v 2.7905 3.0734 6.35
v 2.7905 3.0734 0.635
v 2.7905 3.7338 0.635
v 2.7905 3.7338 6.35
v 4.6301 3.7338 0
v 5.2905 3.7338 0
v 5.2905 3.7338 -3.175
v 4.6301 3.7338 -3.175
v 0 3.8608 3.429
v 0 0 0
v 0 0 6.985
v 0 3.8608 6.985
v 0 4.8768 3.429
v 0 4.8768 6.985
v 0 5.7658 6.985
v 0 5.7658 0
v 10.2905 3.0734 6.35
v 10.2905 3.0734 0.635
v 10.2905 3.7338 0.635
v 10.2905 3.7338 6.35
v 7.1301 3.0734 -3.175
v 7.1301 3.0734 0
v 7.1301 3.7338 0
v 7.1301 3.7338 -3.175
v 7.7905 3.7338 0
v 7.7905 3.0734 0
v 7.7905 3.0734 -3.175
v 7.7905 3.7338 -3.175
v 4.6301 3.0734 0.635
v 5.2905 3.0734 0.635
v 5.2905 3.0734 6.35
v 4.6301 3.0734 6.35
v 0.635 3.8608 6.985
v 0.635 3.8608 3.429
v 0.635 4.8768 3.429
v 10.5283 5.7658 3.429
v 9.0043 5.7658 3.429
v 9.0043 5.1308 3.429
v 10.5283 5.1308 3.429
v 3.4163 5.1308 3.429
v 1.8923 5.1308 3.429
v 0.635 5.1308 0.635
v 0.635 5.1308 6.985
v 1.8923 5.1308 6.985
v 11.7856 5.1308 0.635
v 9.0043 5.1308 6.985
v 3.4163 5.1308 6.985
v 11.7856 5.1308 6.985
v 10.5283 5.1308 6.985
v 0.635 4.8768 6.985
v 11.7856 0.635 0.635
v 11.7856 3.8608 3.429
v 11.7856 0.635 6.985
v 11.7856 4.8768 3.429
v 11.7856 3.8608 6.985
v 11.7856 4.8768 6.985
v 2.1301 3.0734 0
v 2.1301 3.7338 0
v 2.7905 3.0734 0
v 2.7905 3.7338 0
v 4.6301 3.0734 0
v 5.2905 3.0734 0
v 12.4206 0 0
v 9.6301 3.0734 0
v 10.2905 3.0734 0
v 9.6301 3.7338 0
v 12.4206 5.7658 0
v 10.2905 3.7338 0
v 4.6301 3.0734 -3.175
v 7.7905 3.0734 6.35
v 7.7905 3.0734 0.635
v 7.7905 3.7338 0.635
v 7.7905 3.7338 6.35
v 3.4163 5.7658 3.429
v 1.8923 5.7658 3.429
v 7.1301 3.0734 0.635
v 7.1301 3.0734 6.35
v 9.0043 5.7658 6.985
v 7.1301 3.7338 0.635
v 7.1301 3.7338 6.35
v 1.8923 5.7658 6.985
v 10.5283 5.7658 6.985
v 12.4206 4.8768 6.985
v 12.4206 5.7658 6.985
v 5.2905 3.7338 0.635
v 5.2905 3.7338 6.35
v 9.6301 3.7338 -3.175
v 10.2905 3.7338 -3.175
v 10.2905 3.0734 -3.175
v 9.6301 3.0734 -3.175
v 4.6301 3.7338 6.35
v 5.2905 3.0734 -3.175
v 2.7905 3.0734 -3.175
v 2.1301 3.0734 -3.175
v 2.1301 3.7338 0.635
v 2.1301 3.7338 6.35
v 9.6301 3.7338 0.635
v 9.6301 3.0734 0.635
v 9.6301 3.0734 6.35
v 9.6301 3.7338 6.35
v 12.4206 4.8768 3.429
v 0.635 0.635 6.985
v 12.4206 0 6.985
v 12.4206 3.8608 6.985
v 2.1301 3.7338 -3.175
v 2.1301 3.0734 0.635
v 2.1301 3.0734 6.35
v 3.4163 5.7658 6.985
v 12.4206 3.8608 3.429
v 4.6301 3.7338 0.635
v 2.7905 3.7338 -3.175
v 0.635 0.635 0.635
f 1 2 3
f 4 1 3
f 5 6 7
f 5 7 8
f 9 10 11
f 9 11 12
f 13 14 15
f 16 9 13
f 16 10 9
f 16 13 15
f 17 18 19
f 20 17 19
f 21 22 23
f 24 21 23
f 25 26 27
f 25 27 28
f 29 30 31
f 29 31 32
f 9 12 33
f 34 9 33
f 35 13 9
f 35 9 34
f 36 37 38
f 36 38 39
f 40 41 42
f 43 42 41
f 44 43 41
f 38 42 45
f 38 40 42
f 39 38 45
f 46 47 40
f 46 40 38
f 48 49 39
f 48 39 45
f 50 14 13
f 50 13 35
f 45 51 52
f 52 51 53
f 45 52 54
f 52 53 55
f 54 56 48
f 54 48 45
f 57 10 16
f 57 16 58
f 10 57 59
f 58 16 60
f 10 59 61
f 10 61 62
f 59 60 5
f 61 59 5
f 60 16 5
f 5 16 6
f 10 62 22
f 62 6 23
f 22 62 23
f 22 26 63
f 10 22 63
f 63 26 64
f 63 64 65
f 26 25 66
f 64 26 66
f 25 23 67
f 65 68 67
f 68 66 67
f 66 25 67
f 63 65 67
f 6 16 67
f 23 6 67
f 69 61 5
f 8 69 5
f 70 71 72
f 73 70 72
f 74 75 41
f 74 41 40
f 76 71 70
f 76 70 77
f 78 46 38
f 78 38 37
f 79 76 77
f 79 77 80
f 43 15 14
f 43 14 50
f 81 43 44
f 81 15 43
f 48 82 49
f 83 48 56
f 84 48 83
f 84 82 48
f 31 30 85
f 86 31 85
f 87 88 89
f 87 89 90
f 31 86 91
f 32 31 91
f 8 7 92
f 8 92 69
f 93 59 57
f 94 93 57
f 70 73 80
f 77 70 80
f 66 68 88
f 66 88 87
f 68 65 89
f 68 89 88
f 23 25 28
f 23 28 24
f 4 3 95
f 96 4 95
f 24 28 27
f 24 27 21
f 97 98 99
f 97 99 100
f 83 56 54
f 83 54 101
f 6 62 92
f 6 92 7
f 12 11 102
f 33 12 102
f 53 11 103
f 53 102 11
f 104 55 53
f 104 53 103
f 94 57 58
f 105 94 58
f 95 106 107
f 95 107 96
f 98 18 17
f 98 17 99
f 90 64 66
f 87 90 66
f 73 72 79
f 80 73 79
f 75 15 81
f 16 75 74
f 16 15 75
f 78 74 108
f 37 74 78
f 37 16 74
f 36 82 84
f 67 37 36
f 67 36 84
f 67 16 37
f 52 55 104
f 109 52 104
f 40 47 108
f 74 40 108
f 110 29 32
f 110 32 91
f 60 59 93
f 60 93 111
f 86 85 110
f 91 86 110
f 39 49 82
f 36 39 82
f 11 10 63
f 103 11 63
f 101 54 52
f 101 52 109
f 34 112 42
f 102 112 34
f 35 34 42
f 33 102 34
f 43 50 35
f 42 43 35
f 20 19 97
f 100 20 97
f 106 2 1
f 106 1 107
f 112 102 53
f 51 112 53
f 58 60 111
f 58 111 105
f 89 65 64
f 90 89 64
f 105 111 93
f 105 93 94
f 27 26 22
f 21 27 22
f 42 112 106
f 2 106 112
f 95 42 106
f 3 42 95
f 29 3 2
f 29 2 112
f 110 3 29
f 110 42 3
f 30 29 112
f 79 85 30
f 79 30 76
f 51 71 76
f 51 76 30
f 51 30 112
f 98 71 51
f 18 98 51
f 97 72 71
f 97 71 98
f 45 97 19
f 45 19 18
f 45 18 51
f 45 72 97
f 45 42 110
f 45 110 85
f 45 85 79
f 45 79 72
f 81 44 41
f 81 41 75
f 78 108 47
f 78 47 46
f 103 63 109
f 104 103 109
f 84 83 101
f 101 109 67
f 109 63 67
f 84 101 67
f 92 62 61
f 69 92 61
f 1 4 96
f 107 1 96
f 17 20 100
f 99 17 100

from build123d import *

# Parameters (mm, degrees)
SKETCH1_W           = 12.4206
SKETCH1_H           = 5.7658
BOSS_EXTRUDE1_DEPTH = 6.985
SKETCH2_W           = 0.6604
SKETCH2_H           = 0.6604
BOSS_EXTRUDE2_DEPTH = 3.175
SKETCH4_W           = 11.1506
SKETCH4_H           = 4.4958
CUT_EXTRUDE1_DEPTH  = 6.35
SKETCH2_2_W         = 0.6604
SKETCH2_2_H         = 0.6604
BOSS_EXTRUDE3_DEPTH = 6.35
SKETCH5_W           = 0.635
SKETCH5_H           = 1.016
SKETCH5_W_2         = 1.524
SKETCH5_H_2         = 0.635
CUT_EXTRUDE2_DEPTH  = 3.556


with BuildPart() as part:
    # Sketch1 → Boss-Extrude1 (new body)
    with BuildSketch(Plane.XY):
        with Locations((6.2103, 2.8829)):
            Rectangle(SKETCH1_W, SKETCH1_H)
    extrude(amount=BOSS_EXTRUDE1_DEPTH)

    # Sketch2 → Boss-Extrude2 (add)
    with BuildSketch(Plane(origin=(0, 0, 0), x_dir=(-1, 0, 0), z_dir=(0, 0, -1))):
        with Locations((-9.9603, 3.4036)):
            Rectangle(SKETCH2_W, SKETCH2_H)
        with Locations((-7.4603, 3.4036)):
            Rectangle(SKETCH2_W, SKETCH2_H)
        with Locations((-4.9603, 3.4036)):
            Rectangle(SKETCH2_W, SKETCH2_H)
        with Locations((-2.4603, 3.4036)):
            Rectangle(SKETCH2_W, SKETCH2_H)
    extrude(amount=BOSS_EXTRUDE2_DEPTH)

    # Sketch4 → Cut-Extrude1 (cut)
    with BuildSketch(Plane.XY.offset(6.985)):
        with Locations((6.2103, 2.8829)):
            Rectangle(SKETCH4_W, SKETCH4_H)
    extrude(amount=-CUT_EXTRUDE1_DEPTH, mode=Mode.SUBTRACT)

    # Sketch2<2> → Boss-Extrude3 (add)
    with BuildSketch(Plane(origin=(0, 0, 0), x_dir=(-1, 0, 0), z_dir=(0, 0, -1))):
        with Locations((-9.9603, 3.4036)):
            Rectangle(SKETCH2_2_W, SKETCH2_2_H)
        with Locations((-7.4603, 3.4036)):
            Rectangle(SKETCH2_2_W, SKETCH2_2_H)
        with Locations((-4.9603, 3.4036)):
            Rectangle(SKETCH2_2_W, SKETCH2_2_H)
        with Locations((-2.4603, 3.4036)):
            Rectangle(SKETCH2_2_W, SKETCH2_2_H)
    extrude(amount=-BOSS_EXTRUDE3_DEPTH)

    # Sketch5 → Cut-Extrude2 (cut)
    with BuildSketch(Plane.XY.offset(6.985)):
        with Locations((0.3175, 4.3688)):
            Rectangle(SKETCH5_W, SKETCH5_H)
        with Locations((12.1031, 4.3688)):
            Rectangle(SKETCH5_W, SKETCH5_H)
        with Locations((9.7663, 5.4483)):
            Rectangle(SKETCH5_W_2, SKETCH5_H_2)
        with Locations((2.6543, 5.4483)):
            Rectangle(SKETCH5_W_2, SKETCH5_H_2)
    extrude(amount=-CUT_EXTRUDE2_DEPTH, mode=Mode.SUBTRACT)


solid = part.part
